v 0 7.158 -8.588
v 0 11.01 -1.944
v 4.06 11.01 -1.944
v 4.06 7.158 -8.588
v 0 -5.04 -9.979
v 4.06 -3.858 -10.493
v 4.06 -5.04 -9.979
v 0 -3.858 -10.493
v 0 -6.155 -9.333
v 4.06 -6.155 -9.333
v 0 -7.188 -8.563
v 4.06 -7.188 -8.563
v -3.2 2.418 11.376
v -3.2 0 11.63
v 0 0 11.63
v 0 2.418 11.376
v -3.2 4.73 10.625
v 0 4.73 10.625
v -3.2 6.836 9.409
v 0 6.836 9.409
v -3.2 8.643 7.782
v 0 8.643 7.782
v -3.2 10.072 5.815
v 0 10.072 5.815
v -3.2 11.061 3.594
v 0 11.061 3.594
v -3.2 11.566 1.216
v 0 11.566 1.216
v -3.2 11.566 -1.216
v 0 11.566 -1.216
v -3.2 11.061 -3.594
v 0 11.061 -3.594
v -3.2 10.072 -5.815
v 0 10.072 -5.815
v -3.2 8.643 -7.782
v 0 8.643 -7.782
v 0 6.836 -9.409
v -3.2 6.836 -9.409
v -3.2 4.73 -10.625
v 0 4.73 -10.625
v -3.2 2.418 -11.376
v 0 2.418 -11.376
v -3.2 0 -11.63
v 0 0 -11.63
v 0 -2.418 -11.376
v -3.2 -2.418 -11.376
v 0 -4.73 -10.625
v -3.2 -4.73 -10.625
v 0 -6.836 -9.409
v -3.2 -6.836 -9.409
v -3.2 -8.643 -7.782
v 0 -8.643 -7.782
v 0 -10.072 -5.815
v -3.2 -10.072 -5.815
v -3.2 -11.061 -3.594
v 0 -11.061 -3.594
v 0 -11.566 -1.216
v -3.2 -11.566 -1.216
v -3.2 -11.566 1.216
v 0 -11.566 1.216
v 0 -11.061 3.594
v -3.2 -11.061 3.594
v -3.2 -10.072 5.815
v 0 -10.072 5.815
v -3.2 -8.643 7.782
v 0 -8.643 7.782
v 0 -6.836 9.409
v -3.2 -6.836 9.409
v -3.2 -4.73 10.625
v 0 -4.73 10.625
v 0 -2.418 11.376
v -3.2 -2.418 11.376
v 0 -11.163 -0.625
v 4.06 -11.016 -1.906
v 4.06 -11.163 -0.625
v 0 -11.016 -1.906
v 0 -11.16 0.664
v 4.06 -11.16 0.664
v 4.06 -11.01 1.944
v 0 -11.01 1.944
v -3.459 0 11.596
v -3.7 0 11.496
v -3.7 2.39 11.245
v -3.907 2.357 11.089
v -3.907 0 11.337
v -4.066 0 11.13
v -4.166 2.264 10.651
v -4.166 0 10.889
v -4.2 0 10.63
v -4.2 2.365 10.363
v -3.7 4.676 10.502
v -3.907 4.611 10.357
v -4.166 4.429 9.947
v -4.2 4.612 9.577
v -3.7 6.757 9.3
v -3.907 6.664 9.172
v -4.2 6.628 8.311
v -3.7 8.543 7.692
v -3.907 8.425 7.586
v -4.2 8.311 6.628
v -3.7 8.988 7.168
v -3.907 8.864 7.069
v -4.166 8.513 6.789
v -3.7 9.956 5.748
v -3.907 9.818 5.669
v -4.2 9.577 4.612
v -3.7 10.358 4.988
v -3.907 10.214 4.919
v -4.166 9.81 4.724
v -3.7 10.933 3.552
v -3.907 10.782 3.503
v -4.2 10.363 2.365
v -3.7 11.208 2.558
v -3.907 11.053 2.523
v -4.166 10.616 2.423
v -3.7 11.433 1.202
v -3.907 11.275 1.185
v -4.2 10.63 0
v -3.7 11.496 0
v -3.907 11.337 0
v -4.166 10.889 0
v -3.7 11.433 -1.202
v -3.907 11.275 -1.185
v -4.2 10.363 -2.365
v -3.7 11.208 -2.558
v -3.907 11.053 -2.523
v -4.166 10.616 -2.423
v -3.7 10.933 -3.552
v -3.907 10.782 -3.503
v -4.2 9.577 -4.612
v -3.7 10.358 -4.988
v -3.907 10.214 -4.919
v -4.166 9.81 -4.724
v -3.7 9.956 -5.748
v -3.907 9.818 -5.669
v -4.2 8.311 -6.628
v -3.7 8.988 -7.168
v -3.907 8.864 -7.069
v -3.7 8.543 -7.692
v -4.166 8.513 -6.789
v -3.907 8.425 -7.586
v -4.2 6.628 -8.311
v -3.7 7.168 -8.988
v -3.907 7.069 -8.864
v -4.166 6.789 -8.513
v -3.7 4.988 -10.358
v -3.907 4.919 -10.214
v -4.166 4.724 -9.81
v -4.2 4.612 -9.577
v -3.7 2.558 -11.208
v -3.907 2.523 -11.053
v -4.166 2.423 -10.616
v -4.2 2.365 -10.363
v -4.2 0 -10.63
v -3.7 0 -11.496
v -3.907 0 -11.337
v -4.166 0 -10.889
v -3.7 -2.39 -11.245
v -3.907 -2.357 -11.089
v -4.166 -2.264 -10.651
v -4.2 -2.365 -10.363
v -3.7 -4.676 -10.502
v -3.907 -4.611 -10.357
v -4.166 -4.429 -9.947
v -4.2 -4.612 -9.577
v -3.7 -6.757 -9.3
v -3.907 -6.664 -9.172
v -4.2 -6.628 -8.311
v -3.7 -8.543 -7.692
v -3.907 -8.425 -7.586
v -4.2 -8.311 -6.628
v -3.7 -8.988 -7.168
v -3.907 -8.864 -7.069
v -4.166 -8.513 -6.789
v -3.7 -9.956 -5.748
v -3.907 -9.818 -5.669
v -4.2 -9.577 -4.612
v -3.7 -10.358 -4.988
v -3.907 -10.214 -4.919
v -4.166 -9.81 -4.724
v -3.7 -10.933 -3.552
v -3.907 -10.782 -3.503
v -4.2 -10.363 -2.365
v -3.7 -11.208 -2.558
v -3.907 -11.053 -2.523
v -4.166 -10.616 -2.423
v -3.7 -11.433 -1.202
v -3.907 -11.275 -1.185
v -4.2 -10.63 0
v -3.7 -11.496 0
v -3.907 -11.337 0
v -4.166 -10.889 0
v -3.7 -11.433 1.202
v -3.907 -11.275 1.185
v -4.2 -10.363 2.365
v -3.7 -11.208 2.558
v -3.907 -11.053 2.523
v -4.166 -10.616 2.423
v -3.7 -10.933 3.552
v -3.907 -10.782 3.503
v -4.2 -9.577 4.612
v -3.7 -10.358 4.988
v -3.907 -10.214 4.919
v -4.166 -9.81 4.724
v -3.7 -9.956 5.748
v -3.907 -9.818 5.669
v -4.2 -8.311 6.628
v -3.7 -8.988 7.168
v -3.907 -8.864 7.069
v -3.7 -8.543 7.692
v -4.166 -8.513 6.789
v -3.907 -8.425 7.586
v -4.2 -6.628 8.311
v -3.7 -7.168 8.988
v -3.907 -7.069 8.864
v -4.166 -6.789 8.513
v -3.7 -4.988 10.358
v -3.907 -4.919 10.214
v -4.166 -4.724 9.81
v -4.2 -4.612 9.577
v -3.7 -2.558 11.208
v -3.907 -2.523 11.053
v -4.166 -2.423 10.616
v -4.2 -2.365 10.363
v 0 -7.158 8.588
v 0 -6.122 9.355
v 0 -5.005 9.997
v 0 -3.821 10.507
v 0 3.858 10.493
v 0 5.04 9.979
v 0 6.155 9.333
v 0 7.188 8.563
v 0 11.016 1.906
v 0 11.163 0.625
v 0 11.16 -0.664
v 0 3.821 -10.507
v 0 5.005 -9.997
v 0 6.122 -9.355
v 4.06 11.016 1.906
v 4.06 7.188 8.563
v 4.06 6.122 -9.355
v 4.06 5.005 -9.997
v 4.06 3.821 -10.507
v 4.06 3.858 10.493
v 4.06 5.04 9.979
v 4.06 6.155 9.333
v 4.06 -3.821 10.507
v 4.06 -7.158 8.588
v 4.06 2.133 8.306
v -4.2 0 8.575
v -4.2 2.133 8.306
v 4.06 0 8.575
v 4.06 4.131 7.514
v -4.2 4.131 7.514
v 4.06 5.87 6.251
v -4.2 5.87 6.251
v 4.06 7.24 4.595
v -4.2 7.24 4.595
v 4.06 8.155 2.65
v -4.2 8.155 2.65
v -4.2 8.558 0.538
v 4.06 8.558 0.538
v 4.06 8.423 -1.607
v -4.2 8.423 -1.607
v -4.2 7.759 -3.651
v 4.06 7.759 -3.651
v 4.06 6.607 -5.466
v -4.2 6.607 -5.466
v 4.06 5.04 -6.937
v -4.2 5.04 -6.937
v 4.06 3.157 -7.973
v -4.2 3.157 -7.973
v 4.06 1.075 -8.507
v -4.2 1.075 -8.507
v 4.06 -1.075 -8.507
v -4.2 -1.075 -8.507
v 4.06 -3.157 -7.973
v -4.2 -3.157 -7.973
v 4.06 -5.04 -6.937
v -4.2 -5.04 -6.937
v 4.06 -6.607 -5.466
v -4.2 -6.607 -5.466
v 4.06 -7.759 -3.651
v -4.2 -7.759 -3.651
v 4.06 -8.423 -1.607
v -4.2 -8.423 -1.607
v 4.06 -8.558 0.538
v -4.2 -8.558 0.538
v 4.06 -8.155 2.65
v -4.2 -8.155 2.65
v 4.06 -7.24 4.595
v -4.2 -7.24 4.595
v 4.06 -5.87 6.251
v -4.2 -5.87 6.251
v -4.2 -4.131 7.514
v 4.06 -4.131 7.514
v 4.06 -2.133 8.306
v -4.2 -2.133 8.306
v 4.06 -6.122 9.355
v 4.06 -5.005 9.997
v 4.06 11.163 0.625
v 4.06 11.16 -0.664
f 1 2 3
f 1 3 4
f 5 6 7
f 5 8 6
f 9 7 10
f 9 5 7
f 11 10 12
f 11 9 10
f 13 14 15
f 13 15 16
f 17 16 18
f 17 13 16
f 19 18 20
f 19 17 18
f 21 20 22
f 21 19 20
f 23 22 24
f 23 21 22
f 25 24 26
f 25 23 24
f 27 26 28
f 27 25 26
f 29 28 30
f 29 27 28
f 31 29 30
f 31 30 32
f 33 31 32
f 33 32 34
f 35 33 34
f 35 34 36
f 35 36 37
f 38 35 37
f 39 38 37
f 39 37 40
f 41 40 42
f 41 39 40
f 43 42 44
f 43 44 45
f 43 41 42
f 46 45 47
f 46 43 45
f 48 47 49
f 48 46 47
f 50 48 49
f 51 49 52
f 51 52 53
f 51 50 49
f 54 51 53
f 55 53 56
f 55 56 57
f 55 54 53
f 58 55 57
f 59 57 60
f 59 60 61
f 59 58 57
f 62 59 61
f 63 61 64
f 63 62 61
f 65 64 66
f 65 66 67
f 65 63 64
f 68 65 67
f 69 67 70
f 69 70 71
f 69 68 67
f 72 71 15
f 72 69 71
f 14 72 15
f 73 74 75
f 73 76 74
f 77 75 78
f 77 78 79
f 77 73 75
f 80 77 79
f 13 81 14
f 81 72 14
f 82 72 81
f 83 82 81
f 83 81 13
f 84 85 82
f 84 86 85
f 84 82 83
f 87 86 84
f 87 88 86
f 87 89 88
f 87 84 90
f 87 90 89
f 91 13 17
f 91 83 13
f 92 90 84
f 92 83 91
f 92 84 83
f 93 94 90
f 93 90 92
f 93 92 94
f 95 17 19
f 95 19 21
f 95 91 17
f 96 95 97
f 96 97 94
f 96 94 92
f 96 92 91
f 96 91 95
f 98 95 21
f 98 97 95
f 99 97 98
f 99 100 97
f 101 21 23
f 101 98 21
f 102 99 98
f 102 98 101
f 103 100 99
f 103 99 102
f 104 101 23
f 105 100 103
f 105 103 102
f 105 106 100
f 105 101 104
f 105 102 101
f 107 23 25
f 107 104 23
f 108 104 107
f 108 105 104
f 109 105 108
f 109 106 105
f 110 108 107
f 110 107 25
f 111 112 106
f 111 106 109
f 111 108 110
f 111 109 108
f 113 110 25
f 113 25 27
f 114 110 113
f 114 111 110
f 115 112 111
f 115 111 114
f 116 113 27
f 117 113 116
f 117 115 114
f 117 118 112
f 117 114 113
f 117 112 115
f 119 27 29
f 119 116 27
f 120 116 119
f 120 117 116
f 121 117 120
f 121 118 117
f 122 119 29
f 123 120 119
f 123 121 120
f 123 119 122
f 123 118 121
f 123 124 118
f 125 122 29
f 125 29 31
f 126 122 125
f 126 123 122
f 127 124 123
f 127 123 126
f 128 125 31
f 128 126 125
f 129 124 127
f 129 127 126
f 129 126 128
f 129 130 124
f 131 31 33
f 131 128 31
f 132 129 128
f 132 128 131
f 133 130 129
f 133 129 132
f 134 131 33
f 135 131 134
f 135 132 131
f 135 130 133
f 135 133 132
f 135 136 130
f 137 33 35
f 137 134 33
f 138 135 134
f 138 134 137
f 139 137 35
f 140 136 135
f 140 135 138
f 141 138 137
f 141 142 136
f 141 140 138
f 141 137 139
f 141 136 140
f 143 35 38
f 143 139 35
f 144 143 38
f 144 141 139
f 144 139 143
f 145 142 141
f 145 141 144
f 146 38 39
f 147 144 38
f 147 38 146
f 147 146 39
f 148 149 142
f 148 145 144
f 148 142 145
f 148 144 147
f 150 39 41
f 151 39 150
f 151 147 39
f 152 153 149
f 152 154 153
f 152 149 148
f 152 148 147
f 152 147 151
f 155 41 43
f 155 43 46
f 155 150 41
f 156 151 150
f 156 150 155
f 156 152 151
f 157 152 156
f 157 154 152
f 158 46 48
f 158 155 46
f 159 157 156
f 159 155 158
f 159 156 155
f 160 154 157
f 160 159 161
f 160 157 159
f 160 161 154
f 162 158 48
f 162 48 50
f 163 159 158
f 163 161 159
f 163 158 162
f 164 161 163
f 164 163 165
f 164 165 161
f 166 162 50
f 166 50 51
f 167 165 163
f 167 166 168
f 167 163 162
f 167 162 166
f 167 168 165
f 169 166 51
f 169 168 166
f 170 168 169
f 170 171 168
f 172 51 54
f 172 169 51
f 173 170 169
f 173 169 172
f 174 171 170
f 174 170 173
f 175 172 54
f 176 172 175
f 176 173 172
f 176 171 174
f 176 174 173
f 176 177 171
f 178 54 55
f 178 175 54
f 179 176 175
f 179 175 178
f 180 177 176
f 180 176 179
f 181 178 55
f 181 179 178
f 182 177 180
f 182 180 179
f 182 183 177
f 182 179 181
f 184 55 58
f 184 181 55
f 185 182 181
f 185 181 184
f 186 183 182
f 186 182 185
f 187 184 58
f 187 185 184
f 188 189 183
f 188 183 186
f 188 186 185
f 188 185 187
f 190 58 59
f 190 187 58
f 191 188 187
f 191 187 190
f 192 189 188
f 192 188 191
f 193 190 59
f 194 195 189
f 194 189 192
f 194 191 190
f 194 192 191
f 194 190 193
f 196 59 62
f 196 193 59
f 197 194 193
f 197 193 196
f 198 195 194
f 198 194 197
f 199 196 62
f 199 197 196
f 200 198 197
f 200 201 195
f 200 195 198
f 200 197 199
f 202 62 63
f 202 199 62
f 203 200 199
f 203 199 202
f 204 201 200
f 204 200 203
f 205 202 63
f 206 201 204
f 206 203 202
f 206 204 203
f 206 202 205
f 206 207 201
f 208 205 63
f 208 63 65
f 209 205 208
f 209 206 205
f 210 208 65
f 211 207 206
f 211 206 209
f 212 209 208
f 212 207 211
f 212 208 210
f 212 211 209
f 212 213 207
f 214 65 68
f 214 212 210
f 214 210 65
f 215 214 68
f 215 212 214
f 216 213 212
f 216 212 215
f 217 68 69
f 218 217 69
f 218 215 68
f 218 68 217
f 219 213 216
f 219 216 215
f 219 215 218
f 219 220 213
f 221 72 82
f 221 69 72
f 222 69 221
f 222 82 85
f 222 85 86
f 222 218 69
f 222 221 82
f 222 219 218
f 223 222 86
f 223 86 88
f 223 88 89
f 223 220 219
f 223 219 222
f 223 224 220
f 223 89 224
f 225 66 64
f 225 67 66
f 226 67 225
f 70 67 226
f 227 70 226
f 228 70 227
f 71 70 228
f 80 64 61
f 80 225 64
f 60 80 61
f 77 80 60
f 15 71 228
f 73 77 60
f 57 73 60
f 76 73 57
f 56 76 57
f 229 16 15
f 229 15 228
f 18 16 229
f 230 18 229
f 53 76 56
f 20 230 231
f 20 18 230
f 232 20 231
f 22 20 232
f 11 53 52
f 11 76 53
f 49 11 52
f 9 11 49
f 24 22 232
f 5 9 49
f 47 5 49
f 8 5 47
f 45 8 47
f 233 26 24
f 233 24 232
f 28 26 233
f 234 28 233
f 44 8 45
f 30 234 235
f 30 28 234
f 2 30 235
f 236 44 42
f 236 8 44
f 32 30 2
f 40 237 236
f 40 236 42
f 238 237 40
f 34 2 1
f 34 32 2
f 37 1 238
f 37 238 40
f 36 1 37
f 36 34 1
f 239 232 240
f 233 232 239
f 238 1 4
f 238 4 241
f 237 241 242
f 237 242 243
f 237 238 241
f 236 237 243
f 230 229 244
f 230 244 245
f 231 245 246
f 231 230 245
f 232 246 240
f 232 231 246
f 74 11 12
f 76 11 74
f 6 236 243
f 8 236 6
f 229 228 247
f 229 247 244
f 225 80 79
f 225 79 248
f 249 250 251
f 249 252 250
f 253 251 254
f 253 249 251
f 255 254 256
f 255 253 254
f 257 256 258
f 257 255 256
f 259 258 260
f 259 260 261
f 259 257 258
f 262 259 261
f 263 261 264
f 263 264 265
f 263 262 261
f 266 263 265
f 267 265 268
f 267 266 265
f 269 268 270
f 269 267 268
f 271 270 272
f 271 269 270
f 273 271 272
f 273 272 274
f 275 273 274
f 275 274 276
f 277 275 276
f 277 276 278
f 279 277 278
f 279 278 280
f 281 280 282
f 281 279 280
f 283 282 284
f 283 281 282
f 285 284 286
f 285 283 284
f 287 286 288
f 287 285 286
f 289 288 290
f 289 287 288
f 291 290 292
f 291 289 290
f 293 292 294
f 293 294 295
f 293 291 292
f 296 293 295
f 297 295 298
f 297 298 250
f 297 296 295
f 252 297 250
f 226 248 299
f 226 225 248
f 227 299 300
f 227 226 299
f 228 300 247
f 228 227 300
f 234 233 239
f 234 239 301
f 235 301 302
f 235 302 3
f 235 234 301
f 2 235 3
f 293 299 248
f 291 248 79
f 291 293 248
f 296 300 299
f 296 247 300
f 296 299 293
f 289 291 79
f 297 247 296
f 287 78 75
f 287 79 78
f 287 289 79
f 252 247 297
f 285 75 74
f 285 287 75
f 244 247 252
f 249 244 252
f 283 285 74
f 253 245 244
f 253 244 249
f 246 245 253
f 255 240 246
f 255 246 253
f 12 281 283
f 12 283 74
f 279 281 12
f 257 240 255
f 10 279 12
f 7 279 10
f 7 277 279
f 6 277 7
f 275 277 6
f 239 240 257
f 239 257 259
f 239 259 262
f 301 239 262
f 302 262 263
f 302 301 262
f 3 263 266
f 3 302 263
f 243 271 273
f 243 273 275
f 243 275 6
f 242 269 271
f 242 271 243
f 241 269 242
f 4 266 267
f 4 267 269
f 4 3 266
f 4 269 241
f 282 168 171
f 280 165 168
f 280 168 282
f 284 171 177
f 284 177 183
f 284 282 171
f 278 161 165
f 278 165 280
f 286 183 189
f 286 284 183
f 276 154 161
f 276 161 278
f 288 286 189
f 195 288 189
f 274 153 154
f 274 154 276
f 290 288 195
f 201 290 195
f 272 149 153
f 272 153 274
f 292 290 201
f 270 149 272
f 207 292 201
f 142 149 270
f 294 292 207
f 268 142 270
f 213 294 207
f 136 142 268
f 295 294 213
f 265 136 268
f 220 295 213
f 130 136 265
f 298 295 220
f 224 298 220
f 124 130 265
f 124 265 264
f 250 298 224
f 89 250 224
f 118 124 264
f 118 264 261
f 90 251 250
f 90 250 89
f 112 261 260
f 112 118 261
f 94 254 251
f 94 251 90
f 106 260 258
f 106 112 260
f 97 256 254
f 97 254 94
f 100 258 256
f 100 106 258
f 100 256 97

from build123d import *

# Parameters (mm, degrees)
F2_R     = 12.5
F3_DEPTH = 4.06
F4_R     = 1


with BuildPart() as f1:
    # F0 (on Front) → F1 (revolve)
    with BuildSketch(Plane.XZ):
        Polygon((-4.2, 8.575), (4.06, 8.575), (4.06, 11.18), (0, 11.18), (0, 11.63), (-4.2, 11.63), align=None)
    revolve(axis=Axis((0.086747, 0, 0), (-1, 0, 0)))

    # F2 (on Right) → F3 (cut, through all)
    with BuildSketch(Plane.YZ):
        Circle(F2_R)
        Polygon((-6.0438, 10.510589), (6.080537, 10.489379), (12.124337, -0.02121), (6.0438, -10.510589), (-6.080537, -10.489379), (-12.124337, 0.02121), align=None, mode=Mode.SUBTRACT)
    extrude(amount=F3_DEPTH, mode=Mode.SUBTRACT)

    # F4
    f4_edges = [f1.edges().sort_by_distance(p)[0] for p in [
        (-4.2, 0, -11.63),
    ]]
    fillet(f4_edges, radius=F4_R)


solid = f1.part
